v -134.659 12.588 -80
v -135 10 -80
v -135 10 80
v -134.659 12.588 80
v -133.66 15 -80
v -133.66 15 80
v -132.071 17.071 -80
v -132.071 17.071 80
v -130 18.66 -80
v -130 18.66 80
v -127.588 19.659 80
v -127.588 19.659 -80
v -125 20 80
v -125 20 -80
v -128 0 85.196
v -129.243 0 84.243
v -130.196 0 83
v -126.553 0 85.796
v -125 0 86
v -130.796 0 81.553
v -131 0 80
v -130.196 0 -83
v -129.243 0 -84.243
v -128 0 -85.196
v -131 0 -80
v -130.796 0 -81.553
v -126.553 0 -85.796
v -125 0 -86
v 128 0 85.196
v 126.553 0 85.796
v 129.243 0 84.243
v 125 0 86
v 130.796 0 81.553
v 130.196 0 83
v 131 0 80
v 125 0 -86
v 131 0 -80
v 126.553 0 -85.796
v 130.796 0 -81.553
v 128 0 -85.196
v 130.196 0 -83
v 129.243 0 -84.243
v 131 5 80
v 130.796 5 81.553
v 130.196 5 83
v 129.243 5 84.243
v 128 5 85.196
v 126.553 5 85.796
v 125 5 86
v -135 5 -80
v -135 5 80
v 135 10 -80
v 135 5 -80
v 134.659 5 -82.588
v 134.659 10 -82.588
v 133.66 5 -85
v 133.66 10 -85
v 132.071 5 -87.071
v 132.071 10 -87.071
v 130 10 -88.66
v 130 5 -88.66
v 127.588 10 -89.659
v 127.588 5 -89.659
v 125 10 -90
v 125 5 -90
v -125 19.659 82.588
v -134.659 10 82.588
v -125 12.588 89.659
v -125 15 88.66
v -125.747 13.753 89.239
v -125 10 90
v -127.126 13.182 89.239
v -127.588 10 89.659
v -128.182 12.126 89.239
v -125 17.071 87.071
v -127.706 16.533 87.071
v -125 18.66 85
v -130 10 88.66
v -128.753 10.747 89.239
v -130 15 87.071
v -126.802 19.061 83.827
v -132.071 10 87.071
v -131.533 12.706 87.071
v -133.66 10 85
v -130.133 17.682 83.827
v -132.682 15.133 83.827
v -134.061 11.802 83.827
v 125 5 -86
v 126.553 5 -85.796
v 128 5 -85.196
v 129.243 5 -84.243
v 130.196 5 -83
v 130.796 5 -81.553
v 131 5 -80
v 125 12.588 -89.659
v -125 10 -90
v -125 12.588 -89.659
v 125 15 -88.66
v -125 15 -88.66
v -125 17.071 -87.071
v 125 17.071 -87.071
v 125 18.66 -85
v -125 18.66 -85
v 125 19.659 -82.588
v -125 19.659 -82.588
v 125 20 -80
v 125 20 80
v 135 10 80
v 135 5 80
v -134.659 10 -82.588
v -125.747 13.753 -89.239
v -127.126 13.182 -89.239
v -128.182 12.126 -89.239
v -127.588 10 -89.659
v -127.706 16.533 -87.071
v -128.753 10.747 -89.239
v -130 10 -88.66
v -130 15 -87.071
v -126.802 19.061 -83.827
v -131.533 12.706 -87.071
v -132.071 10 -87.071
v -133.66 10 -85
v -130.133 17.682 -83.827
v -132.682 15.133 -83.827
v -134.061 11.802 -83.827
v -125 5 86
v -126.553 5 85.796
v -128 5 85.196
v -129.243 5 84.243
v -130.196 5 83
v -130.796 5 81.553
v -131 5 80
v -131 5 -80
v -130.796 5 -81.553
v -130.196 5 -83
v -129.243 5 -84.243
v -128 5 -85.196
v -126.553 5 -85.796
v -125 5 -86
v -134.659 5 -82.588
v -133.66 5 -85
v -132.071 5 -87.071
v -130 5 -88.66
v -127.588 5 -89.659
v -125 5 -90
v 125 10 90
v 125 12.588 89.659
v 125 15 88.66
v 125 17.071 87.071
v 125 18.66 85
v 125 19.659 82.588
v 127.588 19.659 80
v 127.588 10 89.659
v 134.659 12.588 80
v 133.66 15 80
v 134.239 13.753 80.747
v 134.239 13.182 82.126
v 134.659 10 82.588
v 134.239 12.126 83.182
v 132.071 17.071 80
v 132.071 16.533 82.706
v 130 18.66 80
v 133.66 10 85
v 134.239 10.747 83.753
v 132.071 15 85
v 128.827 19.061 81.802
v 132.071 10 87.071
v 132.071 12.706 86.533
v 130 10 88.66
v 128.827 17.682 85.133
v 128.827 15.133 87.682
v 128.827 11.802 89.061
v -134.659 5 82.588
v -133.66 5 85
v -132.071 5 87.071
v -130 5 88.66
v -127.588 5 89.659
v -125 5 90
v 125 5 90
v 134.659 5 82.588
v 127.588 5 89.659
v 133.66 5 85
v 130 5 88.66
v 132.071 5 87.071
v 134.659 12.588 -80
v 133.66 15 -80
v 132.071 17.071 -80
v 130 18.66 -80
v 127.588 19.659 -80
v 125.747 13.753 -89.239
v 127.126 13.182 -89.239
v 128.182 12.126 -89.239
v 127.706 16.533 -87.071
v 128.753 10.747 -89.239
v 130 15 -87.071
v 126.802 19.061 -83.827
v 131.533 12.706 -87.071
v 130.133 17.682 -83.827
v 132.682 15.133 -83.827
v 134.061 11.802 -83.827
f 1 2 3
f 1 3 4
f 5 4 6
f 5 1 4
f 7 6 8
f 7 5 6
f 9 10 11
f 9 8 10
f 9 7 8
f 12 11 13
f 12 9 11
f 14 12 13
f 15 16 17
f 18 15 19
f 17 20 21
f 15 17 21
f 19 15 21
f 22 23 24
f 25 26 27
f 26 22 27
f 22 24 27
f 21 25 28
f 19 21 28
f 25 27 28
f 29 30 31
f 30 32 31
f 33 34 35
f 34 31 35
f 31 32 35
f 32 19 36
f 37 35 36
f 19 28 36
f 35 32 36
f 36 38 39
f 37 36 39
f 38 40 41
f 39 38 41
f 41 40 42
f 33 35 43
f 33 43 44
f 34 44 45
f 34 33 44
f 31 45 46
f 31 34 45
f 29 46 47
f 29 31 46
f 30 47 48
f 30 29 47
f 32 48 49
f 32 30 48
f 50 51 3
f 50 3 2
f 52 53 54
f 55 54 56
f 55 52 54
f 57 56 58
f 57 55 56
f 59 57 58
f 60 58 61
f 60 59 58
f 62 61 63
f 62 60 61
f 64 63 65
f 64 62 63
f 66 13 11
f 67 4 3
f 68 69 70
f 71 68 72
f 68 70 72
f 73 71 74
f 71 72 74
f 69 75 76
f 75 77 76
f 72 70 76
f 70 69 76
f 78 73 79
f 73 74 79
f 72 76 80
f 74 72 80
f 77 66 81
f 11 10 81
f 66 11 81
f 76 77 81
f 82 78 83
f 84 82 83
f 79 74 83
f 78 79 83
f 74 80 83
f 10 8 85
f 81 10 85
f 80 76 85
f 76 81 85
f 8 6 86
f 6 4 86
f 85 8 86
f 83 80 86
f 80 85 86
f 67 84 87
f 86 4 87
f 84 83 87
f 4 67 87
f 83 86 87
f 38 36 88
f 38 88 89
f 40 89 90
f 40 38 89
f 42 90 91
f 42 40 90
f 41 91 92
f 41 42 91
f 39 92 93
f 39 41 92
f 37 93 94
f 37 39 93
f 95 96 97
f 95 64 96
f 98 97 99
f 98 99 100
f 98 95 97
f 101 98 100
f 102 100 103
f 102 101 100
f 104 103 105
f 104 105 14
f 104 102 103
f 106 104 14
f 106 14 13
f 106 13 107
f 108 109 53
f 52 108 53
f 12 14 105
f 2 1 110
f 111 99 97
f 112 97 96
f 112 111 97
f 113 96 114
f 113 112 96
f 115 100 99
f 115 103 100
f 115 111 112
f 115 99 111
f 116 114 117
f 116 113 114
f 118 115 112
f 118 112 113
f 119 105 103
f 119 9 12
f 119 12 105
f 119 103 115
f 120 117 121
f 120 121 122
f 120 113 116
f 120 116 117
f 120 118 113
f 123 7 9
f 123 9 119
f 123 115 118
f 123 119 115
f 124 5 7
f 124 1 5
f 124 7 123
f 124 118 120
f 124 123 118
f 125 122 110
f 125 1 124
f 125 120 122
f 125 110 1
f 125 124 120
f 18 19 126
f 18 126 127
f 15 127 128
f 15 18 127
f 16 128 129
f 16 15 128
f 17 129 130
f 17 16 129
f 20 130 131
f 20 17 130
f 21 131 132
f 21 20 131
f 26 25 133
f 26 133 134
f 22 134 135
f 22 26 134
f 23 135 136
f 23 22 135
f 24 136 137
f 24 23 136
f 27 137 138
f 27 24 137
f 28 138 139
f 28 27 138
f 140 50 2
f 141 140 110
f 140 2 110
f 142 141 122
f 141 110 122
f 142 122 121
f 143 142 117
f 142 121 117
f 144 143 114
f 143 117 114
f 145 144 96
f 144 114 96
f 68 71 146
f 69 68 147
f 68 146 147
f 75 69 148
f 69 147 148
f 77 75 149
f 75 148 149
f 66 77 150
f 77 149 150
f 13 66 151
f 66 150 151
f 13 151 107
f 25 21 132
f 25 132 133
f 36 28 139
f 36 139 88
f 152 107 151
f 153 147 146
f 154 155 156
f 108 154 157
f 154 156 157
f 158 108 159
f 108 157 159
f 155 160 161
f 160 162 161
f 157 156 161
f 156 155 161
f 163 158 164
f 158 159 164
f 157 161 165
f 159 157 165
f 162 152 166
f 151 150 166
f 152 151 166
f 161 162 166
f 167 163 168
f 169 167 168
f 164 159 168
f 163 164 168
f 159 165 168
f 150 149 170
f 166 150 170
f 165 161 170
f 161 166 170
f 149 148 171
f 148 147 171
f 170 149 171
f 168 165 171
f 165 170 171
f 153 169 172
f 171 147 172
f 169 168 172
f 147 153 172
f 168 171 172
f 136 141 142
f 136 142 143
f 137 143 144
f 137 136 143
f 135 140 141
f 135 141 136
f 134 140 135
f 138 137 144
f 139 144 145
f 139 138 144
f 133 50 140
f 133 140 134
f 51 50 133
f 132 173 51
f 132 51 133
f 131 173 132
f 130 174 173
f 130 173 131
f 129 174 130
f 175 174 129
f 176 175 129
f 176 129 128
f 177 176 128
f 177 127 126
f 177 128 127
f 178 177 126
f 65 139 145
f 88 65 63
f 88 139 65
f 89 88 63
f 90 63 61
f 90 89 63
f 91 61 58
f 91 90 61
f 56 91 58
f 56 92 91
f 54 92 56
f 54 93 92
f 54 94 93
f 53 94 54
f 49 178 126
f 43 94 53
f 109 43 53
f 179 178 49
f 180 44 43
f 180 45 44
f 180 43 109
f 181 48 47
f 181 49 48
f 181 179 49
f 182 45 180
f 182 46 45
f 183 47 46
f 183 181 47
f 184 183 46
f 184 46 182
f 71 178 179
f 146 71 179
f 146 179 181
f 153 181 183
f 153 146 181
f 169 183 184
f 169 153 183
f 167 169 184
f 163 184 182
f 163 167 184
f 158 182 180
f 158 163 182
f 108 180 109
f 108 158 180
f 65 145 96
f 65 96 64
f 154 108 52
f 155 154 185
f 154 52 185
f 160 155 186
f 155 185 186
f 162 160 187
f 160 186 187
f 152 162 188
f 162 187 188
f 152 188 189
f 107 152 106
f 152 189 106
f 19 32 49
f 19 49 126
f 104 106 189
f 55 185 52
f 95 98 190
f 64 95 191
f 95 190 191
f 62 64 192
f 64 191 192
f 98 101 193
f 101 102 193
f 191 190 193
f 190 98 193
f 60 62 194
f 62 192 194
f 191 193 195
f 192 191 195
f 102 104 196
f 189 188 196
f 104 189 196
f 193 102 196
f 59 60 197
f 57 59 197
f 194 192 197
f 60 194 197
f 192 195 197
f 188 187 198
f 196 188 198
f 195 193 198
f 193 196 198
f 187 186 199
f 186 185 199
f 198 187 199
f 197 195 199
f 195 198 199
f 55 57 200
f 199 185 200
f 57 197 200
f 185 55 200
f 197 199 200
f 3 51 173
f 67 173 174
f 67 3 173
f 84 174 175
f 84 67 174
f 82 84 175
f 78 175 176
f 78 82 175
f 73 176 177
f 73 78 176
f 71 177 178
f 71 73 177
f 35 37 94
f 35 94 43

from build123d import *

# Parameters (mm, degrees)
SKETCH1_W      = 270
SKETCH1_H      = 180
EXTRUDE1_DEPTH = 20
FILLET1_R      = 10
EXTRUDE3_DEPTH = 5


with BuildPart() as part:
    # Sketch1 → Extrude1 (new body)
    with BuildSketch(Plane(origin=(0, 0, 0), x_dir=(1, 0, 0), z_dir=(0, 1, 0))):
        Rectangle(SKETCH1_W, SKETCH1_H)
    extrude(amount=EXTRUDE1_DEPTH)

    # Fillet1
    fillet1_edges = [part.edges().sort_by_distance(p)[0] for p in [
        (-135, 20, 0),
        (0, 20, 90),
        (135, 20, 0),
        (0, 20, -90),
        (135, 10, 90),
        (-135, 10, 90),
        (-135, 10, -90),
        (135, 10, -90),
    ]]
    fillet(fillet1_edges, radius=FILLET1_R)

    # Sketch3 → Extrude3 (cut)
    with BuildSketch(Plane.XZ):
        with BuildLine():
            Line((125, 90), (-125, 90))
            ThreePointArc((-125, 90), (-132.071067812, 87.071067812), (-135, 80))
            Line((-135, 80), (-135, -80))
            ThreePointArc((-135, -80), (-132.071067812, -87.071067812), (-125, -90))
            Line((-125, -90), (125, -90))
            ThreePointArc((125, -90), (132.071067812, -87.071067812), (135, -80))
            Line((135, -80), (135, 80))
            ThreePointArc((135, 80), (132.071067812, 87.071067812), (125, 90))
        make_face()
        with BuildLine():
            Line((-131, 80), (-131, -80))
            ThreePointArc((-131, -80), (-129.242640687, -84.242640687), (-125, -86))
            Line((-125, -86), (125, -86))
            ThreePointArc((125, -86), (129.242640687, -84.242640687), (131, -80))
            Line((131, -80), (131, 80))
            ThreePointArc((131, 80), (129.242640687, 84.242640687), (125, 86))
            Line((125, 86), (-125, 86))
            ThreePointArc((-125, 86), (-129.242640687, 84.242640687), (-131, 80))
        make_face(mode=Mode.SUBTRACT)
    extrude(amount=-EXTRUDE3_DEPTH, mode=Mode.SUBTRACT)


solid = part.part
